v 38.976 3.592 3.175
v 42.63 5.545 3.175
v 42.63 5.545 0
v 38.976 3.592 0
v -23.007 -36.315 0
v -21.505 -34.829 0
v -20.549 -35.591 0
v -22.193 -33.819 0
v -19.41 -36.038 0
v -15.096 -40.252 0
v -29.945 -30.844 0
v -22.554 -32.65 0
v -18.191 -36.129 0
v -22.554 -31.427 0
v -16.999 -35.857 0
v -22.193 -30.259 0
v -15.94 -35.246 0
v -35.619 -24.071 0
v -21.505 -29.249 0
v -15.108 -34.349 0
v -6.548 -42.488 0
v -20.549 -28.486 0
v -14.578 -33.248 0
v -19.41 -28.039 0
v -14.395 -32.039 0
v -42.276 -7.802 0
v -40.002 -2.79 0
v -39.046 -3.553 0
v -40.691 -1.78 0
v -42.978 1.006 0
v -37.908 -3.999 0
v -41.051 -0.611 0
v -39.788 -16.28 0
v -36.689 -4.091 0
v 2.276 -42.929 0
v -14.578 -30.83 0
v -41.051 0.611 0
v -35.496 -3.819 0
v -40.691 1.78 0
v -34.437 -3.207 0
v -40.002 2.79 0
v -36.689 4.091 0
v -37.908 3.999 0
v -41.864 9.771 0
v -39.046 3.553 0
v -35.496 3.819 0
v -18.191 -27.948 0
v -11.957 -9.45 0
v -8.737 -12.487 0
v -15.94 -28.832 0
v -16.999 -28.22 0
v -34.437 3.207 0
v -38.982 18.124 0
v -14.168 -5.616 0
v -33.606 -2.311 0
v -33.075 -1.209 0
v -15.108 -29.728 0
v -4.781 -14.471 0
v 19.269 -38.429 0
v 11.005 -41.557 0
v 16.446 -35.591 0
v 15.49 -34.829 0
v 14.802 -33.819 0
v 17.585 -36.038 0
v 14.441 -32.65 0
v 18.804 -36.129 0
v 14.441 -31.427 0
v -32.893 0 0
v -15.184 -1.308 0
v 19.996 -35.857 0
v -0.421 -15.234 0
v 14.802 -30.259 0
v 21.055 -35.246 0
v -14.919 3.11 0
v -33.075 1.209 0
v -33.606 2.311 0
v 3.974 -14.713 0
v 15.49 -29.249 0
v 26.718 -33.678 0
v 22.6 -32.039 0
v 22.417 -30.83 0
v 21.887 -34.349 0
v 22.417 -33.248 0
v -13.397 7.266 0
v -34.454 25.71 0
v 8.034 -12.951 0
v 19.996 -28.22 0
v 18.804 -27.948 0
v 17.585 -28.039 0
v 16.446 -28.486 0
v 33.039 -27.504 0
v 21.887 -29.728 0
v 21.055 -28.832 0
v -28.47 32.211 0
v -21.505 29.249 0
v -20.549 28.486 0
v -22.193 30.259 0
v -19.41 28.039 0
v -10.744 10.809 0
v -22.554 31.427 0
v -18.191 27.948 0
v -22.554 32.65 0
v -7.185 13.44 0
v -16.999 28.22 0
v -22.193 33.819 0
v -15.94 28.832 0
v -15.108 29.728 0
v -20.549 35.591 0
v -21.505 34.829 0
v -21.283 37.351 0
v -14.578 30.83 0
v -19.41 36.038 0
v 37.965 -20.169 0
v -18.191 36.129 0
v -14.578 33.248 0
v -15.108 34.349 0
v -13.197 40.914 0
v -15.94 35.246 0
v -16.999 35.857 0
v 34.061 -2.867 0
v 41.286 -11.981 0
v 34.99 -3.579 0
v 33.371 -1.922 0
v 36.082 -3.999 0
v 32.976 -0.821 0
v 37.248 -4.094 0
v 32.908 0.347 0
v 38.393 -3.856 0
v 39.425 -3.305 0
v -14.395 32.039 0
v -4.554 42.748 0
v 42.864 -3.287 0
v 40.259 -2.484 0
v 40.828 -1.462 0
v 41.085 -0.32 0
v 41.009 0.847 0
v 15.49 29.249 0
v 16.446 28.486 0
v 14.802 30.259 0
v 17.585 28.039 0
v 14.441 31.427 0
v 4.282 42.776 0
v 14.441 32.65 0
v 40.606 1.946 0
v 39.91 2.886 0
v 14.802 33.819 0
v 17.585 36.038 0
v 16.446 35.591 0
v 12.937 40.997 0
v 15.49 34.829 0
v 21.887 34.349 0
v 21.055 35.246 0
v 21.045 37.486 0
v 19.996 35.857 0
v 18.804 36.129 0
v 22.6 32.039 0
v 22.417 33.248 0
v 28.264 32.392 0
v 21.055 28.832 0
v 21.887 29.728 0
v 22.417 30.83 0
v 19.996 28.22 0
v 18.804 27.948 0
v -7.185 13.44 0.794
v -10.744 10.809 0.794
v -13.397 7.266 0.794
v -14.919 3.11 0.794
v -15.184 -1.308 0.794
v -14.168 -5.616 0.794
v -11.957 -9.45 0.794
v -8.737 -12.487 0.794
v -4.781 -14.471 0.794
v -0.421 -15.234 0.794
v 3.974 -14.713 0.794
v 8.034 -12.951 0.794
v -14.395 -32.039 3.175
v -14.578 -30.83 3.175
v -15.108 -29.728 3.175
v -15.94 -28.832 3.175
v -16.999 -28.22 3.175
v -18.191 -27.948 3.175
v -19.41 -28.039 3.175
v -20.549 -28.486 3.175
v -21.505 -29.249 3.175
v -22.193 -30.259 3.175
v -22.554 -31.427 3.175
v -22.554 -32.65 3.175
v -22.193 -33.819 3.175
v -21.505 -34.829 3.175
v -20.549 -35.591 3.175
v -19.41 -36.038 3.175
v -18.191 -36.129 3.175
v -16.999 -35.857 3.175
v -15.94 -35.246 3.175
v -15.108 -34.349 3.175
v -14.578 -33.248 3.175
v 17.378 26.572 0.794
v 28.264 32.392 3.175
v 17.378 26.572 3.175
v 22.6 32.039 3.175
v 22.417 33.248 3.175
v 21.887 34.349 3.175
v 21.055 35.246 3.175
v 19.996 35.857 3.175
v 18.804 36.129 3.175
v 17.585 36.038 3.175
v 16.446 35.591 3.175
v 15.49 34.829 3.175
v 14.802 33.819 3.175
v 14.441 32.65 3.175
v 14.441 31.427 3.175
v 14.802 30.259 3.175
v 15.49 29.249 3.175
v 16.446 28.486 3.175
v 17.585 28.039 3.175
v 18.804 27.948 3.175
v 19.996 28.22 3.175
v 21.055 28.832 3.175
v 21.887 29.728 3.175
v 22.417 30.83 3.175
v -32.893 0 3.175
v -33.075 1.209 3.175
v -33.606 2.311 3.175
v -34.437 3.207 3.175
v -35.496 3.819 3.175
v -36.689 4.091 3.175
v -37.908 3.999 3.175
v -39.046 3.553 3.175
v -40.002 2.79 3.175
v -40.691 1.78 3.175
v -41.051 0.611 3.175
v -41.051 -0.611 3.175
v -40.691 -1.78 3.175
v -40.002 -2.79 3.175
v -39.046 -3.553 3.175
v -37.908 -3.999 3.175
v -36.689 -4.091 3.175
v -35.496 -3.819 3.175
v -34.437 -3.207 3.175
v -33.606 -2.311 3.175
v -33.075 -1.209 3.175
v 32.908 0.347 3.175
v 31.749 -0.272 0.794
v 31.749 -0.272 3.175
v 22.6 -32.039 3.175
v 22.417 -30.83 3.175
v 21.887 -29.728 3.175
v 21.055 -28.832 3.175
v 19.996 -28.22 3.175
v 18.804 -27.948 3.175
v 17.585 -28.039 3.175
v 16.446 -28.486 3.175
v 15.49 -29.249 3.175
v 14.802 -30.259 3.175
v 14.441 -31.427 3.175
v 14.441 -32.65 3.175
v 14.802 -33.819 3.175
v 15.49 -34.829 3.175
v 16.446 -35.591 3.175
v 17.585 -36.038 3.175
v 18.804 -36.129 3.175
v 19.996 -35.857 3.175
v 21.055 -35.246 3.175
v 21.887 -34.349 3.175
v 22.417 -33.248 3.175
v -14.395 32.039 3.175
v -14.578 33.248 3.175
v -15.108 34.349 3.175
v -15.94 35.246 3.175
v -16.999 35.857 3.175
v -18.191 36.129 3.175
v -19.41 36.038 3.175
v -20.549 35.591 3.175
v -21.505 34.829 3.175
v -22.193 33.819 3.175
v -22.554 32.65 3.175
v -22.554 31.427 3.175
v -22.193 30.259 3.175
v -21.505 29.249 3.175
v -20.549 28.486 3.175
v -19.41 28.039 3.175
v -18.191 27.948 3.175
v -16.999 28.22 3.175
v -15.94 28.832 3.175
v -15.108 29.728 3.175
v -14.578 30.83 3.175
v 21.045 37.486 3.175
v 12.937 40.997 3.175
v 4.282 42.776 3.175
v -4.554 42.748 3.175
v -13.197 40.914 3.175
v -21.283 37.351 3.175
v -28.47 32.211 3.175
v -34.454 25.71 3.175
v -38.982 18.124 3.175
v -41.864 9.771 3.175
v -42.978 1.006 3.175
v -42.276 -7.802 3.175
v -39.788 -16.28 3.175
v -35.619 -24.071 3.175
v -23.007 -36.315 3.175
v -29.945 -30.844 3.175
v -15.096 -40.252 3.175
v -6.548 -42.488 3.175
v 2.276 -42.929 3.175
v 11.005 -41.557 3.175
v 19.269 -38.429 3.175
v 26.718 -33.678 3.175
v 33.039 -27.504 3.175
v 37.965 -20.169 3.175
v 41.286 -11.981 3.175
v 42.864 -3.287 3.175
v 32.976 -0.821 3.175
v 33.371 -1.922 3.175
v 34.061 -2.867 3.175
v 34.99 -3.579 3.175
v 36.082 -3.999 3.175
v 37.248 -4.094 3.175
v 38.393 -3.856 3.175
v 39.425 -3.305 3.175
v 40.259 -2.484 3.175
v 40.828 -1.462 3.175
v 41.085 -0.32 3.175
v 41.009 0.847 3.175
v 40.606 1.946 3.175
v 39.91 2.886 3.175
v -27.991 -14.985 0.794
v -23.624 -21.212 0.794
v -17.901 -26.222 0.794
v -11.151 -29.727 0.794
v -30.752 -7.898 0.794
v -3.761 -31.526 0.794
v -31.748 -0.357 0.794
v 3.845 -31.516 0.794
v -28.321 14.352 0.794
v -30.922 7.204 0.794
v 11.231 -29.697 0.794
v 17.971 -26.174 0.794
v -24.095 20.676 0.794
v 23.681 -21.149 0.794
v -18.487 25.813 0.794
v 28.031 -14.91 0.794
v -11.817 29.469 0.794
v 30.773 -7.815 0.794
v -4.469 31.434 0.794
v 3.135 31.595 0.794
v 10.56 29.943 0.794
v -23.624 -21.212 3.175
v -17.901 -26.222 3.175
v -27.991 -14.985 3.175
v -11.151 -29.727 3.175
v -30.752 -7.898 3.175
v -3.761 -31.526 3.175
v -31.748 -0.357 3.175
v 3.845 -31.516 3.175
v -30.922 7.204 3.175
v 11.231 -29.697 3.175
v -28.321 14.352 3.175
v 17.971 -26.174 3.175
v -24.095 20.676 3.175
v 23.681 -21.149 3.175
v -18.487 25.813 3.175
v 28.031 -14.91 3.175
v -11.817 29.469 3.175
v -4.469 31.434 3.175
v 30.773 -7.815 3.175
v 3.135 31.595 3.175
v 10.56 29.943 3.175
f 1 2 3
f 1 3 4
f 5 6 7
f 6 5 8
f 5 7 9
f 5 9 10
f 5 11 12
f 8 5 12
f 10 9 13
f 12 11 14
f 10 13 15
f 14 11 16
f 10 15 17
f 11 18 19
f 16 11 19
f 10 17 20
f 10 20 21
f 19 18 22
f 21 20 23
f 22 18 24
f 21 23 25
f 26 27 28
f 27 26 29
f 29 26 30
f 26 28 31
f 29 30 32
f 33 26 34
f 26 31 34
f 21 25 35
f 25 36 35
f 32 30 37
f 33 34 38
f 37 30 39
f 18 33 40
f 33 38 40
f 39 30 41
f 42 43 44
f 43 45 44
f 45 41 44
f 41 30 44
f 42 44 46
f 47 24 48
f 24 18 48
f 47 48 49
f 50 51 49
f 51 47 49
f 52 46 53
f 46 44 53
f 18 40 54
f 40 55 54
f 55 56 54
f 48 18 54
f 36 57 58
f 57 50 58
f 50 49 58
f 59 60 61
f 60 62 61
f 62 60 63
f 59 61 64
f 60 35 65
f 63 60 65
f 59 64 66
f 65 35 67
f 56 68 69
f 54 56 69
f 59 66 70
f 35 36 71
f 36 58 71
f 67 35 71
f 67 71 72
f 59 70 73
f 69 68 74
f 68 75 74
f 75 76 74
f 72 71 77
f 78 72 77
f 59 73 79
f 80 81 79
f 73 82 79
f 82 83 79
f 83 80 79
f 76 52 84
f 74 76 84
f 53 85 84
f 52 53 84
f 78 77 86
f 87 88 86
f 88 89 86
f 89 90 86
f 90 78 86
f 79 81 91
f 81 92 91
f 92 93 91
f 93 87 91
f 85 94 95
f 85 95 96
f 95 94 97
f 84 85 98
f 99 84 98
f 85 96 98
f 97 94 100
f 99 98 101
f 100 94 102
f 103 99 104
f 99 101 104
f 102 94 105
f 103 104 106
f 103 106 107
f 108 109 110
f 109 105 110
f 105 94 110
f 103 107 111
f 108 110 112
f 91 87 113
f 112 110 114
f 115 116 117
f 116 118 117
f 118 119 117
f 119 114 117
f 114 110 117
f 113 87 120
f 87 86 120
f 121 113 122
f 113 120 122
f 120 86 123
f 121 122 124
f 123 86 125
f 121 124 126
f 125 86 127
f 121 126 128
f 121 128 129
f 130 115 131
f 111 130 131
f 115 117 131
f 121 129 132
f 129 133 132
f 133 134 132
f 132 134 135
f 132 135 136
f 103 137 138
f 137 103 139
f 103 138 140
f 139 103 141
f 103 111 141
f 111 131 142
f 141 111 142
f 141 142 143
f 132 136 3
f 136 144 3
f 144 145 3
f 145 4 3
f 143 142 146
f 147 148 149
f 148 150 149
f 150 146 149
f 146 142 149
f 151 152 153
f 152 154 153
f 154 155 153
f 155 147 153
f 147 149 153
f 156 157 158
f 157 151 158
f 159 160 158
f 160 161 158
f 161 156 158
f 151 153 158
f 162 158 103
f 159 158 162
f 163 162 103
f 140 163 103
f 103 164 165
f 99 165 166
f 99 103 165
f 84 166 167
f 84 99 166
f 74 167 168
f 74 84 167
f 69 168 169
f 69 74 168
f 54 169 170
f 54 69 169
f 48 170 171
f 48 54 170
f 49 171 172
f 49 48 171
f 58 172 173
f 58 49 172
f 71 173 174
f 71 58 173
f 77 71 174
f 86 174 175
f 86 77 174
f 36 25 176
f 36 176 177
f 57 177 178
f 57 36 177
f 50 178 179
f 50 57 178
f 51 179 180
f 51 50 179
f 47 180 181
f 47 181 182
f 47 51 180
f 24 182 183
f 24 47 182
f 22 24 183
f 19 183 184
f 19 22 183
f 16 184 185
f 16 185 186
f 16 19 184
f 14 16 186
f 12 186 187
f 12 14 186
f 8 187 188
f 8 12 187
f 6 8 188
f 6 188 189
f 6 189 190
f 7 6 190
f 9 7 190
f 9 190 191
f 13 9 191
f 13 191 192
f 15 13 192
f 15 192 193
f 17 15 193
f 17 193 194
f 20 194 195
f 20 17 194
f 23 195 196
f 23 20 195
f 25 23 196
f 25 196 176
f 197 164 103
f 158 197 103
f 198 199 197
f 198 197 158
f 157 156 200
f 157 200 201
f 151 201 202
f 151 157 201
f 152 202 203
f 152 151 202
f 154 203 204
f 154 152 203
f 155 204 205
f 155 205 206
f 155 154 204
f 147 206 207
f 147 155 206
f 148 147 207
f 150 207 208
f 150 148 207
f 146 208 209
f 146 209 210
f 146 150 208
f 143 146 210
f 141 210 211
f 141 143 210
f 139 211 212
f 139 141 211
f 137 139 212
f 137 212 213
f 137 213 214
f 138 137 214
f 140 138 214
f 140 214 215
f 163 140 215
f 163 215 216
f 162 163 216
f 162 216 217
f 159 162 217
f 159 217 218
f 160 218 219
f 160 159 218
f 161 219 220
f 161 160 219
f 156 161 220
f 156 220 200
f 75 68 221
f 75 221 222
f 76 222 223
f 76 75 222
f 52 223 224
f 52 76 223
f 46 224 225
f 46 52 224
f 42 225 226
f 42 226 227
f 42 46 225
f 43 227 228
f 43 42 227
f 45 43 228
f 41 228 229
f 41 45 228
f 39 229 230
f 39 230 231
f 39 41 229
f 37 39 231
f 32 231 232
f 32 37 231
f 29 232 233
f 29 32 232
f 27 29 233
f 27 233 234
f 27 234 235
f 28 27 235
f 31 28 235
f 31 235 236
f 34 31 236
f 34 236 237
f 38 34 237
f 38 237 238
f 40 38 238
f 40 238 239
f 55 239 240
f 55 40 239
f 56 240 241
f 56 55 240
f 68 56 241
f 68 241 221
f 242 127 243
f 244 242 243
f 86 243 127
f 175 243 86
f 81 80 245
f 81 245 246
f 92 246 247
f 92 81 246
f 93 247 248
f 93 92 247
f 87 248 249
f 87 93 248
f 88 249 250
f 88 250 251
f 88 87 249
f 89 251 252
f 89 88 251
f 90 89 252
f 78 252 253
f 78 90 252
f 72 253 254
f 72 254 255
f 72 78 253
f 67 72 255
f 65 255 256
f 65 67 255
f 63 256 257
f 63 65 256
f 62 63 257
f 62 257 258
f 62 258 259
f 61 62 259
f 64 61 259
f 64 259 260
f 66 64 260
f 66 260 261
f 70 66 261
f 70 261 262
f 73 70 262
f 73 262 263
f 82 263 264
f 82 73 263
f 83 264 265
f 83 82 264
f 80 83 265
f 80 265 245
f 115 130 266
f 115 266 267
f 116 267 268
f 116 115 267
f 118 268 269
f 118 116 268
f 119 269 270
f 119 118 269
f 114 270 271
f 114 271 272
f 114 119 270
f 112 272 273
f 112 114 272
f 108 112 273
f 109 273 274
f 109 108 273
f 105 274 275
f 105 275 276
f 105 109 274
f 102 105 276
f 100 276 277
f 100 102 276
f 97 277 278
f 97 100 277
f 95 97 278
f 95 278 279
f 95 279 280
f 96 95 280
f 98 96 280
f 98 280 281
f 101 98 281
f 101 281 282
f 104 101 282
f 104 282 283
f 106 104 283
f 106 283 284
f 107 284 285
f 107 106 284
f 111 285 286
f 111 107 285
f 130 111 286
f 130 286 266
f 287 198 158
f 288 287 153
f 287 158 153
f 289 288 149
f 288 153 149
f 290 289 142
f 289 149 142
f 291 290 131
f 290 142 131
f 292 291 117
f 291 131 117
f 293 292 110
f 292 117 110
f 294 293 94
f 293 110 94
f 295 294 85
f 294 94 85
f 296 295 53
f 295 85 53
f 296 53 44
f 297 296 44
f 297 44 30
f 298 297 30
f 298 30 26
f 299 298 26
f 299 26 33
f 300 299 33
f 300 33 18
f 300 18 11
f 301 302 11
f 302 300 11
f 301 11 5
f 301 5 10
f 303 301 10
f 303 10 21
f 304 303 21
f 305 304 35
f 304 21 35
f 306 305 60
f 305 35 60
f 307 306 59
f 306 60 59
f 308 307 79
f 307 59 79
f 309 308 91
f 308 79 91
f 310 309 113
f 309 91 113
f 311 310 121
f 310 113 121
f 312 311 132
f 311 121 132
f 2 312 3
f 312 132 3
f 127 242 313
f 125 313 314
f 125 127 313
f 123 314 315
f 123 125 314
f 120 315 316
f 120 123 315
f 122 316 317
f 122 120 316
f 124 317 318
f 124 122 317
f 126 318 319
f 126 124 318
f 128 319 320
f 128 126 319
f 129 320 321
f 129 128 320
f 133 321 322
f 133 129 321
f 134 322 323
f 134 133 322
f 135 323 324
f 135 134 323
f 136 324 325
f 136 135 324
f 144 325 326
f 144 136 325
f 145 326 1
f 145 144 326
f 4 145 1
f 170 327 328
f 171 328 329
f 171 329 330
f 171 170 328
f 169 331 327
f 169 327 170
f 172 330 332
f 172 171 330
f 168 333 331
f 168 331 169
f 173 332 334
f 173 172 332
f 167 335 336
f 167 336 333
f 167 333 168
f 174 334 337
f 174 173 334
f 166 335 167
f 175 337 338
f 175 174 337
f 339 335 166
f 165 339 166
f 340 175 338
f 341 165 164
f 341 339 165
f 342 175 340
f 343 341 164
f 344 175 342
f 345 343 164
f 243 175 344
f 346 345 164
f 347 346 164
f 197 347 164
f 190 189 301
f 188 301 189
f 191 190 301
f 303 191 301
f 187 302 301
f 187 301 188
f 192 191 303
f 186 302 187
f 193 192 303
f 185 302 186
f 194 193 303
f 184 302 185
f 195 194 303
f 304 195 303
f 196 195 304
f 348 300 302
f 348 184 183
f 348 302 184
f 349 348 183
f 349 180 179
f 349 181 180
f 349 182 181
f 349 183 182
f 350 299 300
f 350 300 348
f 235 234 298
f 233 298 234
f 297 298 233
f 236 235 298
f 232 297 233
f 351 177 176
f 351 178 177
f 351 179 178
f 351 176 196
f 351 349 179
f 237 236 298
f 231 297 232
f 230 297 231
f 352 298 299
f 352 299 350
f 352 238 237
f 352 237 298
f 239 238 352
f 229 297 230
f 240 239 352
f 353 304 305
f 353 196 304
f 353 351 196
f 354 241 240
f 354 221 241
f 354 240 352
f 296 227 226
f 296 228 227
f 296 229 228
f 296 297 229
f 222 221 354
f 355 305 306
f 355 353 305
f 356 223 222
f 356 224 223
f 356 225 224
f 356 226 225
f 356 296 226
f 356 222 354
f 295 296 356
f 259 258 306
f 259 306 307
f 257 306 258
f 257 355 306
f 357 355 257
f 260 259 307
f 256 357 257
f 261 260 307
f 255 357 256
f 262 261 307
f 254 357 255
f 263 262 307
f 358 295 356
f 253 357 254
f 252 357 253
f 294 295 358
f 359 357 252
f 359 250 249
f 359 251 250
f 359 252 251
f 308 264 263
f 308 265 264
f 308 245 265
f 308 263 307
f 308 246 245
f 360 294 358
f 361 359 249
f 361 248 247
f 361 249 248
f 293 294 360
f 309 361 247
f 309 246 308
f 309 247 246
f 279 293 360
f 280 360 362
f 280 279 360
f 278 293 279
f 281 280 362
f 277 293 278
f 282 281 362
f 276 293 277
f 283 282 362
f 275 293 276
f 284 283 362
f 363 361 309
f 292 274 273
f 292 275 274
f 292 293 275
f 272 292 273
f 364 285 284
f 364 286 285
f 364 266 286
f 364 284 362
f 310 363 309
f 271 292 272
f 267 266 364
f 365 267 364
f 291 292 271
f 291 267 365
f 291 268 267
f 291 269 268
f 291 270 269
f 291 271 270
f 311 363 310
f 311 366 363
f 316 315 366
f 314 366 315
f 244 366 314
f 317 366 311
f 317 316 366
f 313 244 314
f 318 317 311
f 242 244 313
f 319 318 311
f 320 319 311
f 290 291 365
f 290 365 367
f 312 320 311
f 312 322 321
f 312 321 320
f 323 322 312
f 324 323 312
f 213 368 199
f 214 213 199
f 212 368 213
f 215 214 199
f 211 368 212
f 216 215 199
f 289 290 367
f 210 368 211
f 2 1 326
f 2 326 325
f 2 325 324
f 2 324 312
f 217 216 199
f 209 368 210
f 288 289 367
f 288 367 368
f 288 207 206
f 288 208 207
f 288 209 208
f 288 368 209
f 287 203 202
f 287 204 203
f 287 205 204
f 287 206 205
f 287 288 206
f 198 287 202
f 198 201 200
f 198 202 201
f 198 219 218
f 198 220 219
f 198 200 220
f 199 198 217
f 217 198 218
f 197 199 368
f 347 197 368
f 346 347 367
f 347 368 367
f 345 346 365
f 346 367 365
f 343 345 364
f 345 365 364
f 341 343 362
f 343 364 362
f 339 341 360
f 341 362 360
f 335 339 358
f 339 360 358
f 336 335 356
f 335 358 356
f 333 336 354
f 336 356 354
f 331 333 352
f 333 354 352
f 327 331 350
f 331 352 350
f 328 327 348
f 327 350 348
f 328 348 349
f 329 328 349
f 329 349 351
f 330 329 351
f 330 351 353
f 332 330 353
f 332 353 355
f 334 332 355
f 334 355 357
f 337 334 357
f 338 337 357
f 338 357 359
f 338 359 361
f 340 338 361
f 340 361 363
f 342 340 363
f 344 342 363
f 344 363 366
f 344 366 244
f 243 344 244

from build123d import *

# Parameters (mm, degrees)
SKETCH2_R           = 42.9895
SKETCH2_R_2         = 4.1021
SKETCH2_R_3         = 15.24
BOSS_EXTRUDE2_DEPTH = 3.175
SKETCH3_R           = 31.75
CUT_EXTRUDE1_DEPTH  = 2.38125
CUT_EXTRUDE2_DEPTH  = 4.1275


with BuildPart() as part:
    # Sketch2 → Boss-Extrude2 (new body)
    with BuildSketch(Plane.XY):
        with Locations((-4e-09, 0)):
            Circle(SKETCH2_R)
        with Locations((-18.49755, 32.038696425)):
            Circle(SKETCH2_R_2, mode=Mode.SUBTRACT)
        with Locations((18.49755, 32.038696425)):
            Circle(SKETCH2_R_2, mode=Mode.SUBTRACT)
        with Locations((36.9951, 0)):
            Circle(SKETCH2_R_2, mode=Mode.SUBTRACT)
        with Locations((18.49755, -32.038696425)):
            Circle(SKETCH2_R_2, mode=Mode.SUBTRACT)
        with Locations((-18.49755, -32.038696425)):
            Circle(SKETCH2_R_2, mode=Mode.SUBTRACT)
        with Locations((-36.9951, 0)):
            Circle(SKETCH2_R_2, mode=Mode.SUBTRACT)
        with Locations((-4e-09, 0)):
            Circle(SKETCH2_R_3, mode=Mode.SUBTRACT)
    extrude(amount=BOSS_EXTRUDE2_DEPTH)

    # Sketch3 → Cut-Extrude1 (cut)
    with BuildSketch(Plane.XY.offset(3.175)):
        with Locations((-4e-09, 0)):
            Circle(SKETCH3_R)
    extrude(amount=-CUT_EXTRUDE1_DEPTH, mode=Mode.SUBTRACT)

    # Sketch3<3> → Cut-Extrude2 (cut)
    with BuildSketch(Plane.XY.offset(3.175)):
        Polygon((-7.185170954, 13.439900239), (37.844396615, 37.513378093), (51.563249181, 10.3209669), (6.307069446, -13.873661195), align=None)
    extrude(amount=-CUT_EXTRUDE2_DEPTH, mode=Mode.SUBTRACT)


solid = part.part
